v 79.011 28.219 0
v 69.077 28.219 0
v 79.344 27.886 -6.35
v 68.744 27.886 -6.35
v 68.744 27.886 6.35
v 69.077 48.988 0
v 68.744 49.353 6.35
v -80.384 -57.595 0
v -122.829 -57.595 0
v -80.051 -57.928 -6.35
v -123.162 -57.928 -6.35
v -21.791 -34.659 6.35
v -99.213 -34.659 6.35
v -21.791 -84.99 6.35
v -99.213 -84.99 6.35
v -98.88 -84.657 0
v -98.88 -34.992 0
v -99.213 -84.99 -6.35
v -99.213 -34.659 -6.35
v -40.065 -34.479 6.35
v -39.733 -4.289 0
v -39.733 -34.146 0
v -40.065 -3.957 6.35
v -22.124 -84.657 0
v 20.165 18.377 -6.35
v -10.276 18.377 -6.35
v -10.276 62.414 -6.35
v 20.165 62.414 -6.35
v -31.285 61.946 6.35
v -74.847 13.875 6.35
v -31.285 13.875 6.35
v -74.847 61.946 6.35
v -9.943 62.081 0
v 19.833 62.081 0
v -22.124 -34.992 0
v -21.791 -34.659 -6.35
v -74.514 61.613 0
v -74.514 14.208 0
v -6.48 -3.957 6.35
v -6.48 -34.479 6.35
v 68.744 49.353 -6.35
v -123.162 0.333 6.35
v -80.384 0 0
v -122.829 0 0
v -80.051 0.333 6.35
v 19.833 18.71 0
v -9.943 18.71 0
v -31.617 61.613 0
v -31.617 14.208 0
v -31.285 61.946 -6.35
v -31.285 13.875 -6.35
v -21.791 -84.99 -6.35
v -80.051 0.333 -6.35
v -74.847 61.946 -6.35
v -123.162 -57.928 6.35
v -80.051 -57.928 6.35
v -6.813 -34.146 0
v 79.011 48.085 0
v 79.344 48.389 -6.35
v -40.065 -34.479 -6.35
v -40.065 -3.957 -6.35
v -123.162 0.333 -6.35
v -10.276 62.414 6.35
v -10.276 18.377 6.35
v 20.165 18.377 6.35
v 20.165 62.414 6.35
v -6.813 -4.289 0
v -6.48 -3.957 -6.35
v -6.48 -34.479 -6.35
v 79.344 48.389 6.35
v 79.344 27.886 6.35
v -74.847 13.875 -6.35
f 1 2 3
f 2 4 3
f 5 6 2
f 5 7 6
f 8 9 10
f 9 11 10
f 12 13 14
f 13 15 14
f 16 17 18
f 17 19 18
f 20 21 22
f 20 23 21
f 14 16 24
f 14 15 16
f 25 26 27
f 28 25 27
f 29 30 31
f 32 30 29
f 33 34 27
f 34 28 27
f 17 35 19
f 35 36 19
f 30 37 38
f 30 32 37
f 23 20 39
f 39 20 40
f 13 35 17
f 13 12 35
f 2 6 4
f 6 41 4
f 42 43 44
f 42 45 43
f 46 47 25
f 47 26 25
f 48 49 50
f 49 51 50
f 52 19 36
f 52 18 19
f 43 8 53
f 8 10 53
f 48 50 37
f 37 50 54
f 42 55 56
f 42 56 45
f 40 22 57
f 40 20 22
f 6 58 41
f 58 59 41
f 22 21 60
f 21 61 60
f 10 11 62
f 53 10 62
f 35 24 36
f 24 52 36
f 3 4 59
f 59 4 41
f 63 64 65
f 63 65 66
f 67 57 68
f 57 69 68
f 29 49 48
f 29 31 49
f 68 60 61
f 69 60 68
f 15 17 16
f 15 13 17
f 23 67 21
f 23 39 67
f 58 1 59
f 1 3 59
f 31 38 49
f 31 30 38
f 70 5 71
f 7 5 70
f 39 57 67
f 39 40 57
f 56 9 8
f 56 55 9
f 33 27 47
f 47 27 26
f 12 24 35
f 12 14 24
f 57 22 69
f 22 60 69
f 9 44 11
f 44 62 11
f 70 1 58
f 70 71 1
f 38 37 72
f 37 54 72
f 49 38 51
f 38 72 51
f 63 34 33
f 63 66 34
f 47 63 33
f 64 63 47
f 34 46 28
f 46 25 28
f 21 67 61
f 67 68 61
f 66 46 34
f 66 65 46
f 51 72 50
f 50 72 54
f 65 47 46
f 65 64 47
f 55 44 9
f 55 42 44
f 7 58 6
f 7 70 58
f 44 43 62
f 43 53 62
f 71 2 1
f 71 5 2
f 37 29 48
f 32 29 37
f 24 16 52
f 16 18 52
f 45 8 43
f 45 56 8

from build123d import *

# Parameters (mm, degrees)
F0_W     = 76.7561085522
F0_H     = 49.6657192707
F6_DEPTH = 6.35
F6_TAPER = -3
F5_W     = 42.4450933933
F5_H     = 57.5952939689
F1_W     = 32.919710385
F1_H     = 29.8570169423
F3_W     = 29.7758458182
F3_H     = 43.3714538813
F2_W     = 9.9339559674
F2_H     = 13.9966998249
F4_W     = 42.8966358304
F4_H     = 47.4050398916


with BuildPart() as f6:
    # F0 (on Top) → F6 (new body, symmetric)
    with BuildSketch(Plane.XY):
        with Locations((-60.5018716305, -59.8246231675)):
            Rectangle(F0_W, F0_H)
    extrude(amount=F6_DEPTH, both=True, taper=F6_TAPER)


with BuildPart() as f6b:
    # F5 (on Top) → F6, piece 2 (new body, symmetric)
    with BuildSketch(Plane.XY):
        with Locations((-101.6065478325, -28.7976469845)):
            Rectangle(F5_W, F5_H)
    extrude(amount=F6_DEPTH, both=True, taper=F6_TAPER)


with BuildPart() as f6c:
    # F1 (on Top) → F6, piece 3 (new body, symmetric)
    with BuildSketch(Plane.XY):
        with Locations((-23.2727164988, -19.2178268129)):
            Rectangle(F1_W, F1_H)
    extrude(amount=F6_DEPTH, both=True, taper=F6_TAPER)


with BuildPart() as f6d:
    # F3 (on Top) → F6, piece 4 (new body, symmetric)
    with BuildSketch(Plane.XY):
        with Locations((4.9447161146, 40.3955616057)):
            Rectangle(F3_W, F3_H)
    extrude(amount=F6_DEPTH, both=True, taper=F6_TAPER)


with BuildPart() as f6e:
    # F2 (on Top) → F6, piece 5 (new body, symmetric)
    with BuildSketch(Plane.XY):
        with Locations((74.0438885987, 35.2175002918)):
            Rectangle(F2_W, F2_H)
        Polygon((69.076910615, 48.9884503186), (69.076910615, 42.2158502042), (79.0108665824, 42.2158502042), (79.0108665824, 48.0854362249), align=None)
    extrude(amount=F6_DEPTH, both=True, taper=F6_TAPER)


with BuildPart() as f6f:
    # F4 (on Top) → F6, piece 6 (new body, symmetric)
    with BuildSketch(Plane.XY):
        with Locations((-53.0656166375, 37.9106448963)):
            Rectangle(F4_W, F4_H)
    extrude(amount=F6_DEPTH, both=True, taper=F6_TAPER)


solid = Compound([f6.part, f6b.part, f6c.part, f6d.part, f6e.part, f6f.part])
